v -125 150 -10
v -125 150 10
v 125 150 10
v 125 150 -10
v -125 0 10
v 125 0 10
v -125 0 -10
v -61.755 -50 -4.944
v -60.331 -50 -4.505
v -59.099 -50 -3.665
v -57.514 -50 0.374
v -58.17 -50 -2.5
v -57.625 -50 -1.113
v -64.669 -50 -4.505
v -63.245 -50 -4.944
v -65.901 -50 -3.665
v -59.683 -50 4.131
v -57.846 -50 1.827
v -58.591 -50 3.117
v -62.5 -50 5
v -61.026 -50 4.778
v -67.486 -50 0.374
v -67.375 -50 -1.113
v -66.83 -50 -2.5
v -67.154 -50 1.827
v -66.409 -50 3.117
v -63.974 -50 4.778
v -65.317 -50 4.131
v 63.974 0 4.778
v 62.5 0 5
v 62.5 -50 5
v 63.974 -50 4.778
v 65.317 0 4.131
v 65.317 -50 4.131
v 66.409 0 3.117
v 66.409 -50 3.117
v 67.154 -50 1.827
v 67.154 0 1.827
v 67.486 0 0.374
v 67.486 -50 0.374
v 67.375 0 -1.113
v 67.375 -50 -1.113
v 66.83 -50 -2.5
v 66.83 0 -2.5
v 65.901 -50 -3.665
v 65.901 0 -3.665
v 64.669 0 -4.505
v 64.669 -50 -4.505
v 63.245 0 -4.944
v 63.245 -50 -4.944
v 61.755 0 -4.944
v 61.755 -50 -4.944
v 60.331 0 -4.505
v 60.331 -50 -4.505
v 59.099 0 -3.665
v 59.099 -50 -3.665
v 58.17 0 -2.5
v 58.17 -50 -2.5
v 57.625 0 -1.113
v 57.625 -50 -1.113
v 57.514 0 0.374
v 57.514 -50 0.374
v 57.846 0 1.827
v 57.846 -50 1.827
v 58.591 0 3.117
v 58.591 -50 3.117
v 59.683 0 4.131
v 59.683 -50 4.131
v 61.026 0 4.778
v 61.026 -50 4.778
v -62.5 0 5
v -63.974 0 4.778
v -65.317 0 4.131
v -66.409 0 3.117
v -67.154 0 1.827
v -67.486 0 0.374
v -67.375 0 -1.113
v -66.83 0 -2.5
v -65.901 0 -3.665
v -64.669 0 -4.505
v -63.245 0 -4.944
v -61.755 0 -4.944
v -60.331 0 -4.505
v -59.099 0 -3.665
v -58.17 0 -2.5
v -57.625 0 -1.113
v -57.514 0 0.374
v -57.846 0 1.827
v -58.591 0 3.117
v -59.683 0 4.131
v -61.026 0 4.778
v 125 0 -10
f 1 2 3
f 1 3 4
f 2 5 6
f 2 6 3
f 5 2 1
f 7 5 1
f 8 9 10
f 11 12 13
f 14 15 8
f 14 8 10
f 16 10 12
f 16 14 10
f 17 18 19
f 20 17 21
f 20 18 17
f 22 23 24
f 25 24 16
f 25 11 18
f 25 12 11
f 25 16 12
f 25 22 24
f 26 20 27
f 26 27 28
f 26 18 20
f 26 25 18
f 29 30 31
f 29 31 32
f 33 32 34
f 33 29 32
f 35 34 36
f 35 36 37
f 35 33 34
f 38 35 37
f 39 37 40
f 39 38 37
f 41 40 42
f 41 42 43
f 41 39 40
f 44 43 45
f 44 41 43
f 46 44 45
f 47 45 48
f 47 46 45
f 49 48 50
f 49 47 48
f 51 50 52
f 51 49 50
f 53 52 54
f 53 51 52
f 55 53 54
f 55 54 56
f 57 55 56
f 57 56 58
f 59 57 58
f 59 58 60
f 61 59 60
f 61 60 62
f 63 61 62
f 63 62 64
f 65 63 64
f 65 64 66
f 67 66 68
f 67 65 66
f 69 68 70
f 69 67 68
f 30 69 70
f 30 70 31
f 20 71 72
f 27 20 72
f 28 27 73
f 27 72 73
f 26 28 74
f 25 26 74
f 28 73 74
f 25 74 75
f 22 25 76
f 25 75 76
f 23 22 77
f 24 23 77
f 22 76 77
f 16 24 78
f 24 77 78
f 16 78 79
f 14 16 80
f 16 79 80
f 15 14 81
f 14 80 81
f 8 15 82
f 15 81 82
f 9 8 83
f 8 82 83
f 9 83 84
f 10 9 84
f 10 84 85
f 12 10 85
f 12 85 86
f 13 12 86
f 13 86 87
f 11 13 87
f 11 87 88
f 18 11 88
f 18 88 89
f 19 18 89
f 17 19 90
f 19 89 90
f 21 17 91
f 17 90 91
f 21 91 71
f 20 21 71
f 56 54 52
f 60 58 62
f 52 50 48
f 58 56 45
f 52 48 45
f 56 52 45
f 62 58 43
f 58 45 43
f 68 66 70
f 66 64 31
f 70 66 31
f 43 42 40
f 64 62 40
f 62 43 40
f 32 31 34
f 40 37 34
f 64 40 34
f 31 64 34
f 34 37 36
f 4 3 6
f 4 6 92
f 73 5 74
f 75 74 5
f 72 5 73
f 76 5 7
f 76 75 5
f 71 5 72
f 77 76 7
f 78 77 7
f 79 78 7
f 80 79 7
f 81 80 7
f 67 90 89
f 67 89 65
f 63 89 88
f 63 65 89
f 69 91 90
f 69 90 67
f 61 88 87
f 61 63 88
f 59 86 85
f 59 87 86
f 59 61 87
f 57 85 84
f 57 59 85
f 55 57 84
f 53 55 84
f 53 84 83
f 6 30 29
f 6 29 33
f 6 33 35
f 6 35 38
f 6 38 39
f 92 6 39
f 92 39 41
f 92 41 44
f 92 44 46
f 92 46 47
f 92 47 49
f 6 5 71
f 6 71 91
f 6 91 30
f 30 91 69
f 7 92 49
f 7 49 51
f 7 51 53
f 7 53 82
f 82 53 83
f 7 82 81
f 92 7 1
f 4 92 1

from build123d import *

# Parameters (mm, degrees)
SKETCH2_W           = 20
SKETCH2_H           = 150
BOSS_EXTRUDE2_DEPTH = 125
SKETCH3_R           = 5
BOSS_EXTRUDE3_DEPTH = 50


with BuildPart() as part:
    # Sketch2 → Boss-Extrude2 (new, symmetric)
    with BuildSketch(Plane(origin=(0, 0, 0), x_dir=(0, 0, -1), z_dir=(1, 0, 0))):
        with Locations((0, 75)):
            Rectangle(SKETCH2_W, SKETCH2_H)
    extrude(amount=BOSS_EXTRUDE2_DEPTH, both=True)

    # Sketch3 → Boss-Extrude3 (add)
    with BuildSketch(Plane.XZ):
        with Locations(Location((-62.5, 0, 0), (0, 0, 90))):
            Circle(SKETCH3_R)
    boss_extrude3 = extrude(amount=BOSS_EXTRUDE3_DEPTH)

    # Mirror1: Boss-Extrude3 across plane
    add(boss_extrude3.mirror(Plane(origin=(0, 0, 0), x_dir=(0, 0, 1), z_dir=(1, 0, 0))))


solid = part.part
